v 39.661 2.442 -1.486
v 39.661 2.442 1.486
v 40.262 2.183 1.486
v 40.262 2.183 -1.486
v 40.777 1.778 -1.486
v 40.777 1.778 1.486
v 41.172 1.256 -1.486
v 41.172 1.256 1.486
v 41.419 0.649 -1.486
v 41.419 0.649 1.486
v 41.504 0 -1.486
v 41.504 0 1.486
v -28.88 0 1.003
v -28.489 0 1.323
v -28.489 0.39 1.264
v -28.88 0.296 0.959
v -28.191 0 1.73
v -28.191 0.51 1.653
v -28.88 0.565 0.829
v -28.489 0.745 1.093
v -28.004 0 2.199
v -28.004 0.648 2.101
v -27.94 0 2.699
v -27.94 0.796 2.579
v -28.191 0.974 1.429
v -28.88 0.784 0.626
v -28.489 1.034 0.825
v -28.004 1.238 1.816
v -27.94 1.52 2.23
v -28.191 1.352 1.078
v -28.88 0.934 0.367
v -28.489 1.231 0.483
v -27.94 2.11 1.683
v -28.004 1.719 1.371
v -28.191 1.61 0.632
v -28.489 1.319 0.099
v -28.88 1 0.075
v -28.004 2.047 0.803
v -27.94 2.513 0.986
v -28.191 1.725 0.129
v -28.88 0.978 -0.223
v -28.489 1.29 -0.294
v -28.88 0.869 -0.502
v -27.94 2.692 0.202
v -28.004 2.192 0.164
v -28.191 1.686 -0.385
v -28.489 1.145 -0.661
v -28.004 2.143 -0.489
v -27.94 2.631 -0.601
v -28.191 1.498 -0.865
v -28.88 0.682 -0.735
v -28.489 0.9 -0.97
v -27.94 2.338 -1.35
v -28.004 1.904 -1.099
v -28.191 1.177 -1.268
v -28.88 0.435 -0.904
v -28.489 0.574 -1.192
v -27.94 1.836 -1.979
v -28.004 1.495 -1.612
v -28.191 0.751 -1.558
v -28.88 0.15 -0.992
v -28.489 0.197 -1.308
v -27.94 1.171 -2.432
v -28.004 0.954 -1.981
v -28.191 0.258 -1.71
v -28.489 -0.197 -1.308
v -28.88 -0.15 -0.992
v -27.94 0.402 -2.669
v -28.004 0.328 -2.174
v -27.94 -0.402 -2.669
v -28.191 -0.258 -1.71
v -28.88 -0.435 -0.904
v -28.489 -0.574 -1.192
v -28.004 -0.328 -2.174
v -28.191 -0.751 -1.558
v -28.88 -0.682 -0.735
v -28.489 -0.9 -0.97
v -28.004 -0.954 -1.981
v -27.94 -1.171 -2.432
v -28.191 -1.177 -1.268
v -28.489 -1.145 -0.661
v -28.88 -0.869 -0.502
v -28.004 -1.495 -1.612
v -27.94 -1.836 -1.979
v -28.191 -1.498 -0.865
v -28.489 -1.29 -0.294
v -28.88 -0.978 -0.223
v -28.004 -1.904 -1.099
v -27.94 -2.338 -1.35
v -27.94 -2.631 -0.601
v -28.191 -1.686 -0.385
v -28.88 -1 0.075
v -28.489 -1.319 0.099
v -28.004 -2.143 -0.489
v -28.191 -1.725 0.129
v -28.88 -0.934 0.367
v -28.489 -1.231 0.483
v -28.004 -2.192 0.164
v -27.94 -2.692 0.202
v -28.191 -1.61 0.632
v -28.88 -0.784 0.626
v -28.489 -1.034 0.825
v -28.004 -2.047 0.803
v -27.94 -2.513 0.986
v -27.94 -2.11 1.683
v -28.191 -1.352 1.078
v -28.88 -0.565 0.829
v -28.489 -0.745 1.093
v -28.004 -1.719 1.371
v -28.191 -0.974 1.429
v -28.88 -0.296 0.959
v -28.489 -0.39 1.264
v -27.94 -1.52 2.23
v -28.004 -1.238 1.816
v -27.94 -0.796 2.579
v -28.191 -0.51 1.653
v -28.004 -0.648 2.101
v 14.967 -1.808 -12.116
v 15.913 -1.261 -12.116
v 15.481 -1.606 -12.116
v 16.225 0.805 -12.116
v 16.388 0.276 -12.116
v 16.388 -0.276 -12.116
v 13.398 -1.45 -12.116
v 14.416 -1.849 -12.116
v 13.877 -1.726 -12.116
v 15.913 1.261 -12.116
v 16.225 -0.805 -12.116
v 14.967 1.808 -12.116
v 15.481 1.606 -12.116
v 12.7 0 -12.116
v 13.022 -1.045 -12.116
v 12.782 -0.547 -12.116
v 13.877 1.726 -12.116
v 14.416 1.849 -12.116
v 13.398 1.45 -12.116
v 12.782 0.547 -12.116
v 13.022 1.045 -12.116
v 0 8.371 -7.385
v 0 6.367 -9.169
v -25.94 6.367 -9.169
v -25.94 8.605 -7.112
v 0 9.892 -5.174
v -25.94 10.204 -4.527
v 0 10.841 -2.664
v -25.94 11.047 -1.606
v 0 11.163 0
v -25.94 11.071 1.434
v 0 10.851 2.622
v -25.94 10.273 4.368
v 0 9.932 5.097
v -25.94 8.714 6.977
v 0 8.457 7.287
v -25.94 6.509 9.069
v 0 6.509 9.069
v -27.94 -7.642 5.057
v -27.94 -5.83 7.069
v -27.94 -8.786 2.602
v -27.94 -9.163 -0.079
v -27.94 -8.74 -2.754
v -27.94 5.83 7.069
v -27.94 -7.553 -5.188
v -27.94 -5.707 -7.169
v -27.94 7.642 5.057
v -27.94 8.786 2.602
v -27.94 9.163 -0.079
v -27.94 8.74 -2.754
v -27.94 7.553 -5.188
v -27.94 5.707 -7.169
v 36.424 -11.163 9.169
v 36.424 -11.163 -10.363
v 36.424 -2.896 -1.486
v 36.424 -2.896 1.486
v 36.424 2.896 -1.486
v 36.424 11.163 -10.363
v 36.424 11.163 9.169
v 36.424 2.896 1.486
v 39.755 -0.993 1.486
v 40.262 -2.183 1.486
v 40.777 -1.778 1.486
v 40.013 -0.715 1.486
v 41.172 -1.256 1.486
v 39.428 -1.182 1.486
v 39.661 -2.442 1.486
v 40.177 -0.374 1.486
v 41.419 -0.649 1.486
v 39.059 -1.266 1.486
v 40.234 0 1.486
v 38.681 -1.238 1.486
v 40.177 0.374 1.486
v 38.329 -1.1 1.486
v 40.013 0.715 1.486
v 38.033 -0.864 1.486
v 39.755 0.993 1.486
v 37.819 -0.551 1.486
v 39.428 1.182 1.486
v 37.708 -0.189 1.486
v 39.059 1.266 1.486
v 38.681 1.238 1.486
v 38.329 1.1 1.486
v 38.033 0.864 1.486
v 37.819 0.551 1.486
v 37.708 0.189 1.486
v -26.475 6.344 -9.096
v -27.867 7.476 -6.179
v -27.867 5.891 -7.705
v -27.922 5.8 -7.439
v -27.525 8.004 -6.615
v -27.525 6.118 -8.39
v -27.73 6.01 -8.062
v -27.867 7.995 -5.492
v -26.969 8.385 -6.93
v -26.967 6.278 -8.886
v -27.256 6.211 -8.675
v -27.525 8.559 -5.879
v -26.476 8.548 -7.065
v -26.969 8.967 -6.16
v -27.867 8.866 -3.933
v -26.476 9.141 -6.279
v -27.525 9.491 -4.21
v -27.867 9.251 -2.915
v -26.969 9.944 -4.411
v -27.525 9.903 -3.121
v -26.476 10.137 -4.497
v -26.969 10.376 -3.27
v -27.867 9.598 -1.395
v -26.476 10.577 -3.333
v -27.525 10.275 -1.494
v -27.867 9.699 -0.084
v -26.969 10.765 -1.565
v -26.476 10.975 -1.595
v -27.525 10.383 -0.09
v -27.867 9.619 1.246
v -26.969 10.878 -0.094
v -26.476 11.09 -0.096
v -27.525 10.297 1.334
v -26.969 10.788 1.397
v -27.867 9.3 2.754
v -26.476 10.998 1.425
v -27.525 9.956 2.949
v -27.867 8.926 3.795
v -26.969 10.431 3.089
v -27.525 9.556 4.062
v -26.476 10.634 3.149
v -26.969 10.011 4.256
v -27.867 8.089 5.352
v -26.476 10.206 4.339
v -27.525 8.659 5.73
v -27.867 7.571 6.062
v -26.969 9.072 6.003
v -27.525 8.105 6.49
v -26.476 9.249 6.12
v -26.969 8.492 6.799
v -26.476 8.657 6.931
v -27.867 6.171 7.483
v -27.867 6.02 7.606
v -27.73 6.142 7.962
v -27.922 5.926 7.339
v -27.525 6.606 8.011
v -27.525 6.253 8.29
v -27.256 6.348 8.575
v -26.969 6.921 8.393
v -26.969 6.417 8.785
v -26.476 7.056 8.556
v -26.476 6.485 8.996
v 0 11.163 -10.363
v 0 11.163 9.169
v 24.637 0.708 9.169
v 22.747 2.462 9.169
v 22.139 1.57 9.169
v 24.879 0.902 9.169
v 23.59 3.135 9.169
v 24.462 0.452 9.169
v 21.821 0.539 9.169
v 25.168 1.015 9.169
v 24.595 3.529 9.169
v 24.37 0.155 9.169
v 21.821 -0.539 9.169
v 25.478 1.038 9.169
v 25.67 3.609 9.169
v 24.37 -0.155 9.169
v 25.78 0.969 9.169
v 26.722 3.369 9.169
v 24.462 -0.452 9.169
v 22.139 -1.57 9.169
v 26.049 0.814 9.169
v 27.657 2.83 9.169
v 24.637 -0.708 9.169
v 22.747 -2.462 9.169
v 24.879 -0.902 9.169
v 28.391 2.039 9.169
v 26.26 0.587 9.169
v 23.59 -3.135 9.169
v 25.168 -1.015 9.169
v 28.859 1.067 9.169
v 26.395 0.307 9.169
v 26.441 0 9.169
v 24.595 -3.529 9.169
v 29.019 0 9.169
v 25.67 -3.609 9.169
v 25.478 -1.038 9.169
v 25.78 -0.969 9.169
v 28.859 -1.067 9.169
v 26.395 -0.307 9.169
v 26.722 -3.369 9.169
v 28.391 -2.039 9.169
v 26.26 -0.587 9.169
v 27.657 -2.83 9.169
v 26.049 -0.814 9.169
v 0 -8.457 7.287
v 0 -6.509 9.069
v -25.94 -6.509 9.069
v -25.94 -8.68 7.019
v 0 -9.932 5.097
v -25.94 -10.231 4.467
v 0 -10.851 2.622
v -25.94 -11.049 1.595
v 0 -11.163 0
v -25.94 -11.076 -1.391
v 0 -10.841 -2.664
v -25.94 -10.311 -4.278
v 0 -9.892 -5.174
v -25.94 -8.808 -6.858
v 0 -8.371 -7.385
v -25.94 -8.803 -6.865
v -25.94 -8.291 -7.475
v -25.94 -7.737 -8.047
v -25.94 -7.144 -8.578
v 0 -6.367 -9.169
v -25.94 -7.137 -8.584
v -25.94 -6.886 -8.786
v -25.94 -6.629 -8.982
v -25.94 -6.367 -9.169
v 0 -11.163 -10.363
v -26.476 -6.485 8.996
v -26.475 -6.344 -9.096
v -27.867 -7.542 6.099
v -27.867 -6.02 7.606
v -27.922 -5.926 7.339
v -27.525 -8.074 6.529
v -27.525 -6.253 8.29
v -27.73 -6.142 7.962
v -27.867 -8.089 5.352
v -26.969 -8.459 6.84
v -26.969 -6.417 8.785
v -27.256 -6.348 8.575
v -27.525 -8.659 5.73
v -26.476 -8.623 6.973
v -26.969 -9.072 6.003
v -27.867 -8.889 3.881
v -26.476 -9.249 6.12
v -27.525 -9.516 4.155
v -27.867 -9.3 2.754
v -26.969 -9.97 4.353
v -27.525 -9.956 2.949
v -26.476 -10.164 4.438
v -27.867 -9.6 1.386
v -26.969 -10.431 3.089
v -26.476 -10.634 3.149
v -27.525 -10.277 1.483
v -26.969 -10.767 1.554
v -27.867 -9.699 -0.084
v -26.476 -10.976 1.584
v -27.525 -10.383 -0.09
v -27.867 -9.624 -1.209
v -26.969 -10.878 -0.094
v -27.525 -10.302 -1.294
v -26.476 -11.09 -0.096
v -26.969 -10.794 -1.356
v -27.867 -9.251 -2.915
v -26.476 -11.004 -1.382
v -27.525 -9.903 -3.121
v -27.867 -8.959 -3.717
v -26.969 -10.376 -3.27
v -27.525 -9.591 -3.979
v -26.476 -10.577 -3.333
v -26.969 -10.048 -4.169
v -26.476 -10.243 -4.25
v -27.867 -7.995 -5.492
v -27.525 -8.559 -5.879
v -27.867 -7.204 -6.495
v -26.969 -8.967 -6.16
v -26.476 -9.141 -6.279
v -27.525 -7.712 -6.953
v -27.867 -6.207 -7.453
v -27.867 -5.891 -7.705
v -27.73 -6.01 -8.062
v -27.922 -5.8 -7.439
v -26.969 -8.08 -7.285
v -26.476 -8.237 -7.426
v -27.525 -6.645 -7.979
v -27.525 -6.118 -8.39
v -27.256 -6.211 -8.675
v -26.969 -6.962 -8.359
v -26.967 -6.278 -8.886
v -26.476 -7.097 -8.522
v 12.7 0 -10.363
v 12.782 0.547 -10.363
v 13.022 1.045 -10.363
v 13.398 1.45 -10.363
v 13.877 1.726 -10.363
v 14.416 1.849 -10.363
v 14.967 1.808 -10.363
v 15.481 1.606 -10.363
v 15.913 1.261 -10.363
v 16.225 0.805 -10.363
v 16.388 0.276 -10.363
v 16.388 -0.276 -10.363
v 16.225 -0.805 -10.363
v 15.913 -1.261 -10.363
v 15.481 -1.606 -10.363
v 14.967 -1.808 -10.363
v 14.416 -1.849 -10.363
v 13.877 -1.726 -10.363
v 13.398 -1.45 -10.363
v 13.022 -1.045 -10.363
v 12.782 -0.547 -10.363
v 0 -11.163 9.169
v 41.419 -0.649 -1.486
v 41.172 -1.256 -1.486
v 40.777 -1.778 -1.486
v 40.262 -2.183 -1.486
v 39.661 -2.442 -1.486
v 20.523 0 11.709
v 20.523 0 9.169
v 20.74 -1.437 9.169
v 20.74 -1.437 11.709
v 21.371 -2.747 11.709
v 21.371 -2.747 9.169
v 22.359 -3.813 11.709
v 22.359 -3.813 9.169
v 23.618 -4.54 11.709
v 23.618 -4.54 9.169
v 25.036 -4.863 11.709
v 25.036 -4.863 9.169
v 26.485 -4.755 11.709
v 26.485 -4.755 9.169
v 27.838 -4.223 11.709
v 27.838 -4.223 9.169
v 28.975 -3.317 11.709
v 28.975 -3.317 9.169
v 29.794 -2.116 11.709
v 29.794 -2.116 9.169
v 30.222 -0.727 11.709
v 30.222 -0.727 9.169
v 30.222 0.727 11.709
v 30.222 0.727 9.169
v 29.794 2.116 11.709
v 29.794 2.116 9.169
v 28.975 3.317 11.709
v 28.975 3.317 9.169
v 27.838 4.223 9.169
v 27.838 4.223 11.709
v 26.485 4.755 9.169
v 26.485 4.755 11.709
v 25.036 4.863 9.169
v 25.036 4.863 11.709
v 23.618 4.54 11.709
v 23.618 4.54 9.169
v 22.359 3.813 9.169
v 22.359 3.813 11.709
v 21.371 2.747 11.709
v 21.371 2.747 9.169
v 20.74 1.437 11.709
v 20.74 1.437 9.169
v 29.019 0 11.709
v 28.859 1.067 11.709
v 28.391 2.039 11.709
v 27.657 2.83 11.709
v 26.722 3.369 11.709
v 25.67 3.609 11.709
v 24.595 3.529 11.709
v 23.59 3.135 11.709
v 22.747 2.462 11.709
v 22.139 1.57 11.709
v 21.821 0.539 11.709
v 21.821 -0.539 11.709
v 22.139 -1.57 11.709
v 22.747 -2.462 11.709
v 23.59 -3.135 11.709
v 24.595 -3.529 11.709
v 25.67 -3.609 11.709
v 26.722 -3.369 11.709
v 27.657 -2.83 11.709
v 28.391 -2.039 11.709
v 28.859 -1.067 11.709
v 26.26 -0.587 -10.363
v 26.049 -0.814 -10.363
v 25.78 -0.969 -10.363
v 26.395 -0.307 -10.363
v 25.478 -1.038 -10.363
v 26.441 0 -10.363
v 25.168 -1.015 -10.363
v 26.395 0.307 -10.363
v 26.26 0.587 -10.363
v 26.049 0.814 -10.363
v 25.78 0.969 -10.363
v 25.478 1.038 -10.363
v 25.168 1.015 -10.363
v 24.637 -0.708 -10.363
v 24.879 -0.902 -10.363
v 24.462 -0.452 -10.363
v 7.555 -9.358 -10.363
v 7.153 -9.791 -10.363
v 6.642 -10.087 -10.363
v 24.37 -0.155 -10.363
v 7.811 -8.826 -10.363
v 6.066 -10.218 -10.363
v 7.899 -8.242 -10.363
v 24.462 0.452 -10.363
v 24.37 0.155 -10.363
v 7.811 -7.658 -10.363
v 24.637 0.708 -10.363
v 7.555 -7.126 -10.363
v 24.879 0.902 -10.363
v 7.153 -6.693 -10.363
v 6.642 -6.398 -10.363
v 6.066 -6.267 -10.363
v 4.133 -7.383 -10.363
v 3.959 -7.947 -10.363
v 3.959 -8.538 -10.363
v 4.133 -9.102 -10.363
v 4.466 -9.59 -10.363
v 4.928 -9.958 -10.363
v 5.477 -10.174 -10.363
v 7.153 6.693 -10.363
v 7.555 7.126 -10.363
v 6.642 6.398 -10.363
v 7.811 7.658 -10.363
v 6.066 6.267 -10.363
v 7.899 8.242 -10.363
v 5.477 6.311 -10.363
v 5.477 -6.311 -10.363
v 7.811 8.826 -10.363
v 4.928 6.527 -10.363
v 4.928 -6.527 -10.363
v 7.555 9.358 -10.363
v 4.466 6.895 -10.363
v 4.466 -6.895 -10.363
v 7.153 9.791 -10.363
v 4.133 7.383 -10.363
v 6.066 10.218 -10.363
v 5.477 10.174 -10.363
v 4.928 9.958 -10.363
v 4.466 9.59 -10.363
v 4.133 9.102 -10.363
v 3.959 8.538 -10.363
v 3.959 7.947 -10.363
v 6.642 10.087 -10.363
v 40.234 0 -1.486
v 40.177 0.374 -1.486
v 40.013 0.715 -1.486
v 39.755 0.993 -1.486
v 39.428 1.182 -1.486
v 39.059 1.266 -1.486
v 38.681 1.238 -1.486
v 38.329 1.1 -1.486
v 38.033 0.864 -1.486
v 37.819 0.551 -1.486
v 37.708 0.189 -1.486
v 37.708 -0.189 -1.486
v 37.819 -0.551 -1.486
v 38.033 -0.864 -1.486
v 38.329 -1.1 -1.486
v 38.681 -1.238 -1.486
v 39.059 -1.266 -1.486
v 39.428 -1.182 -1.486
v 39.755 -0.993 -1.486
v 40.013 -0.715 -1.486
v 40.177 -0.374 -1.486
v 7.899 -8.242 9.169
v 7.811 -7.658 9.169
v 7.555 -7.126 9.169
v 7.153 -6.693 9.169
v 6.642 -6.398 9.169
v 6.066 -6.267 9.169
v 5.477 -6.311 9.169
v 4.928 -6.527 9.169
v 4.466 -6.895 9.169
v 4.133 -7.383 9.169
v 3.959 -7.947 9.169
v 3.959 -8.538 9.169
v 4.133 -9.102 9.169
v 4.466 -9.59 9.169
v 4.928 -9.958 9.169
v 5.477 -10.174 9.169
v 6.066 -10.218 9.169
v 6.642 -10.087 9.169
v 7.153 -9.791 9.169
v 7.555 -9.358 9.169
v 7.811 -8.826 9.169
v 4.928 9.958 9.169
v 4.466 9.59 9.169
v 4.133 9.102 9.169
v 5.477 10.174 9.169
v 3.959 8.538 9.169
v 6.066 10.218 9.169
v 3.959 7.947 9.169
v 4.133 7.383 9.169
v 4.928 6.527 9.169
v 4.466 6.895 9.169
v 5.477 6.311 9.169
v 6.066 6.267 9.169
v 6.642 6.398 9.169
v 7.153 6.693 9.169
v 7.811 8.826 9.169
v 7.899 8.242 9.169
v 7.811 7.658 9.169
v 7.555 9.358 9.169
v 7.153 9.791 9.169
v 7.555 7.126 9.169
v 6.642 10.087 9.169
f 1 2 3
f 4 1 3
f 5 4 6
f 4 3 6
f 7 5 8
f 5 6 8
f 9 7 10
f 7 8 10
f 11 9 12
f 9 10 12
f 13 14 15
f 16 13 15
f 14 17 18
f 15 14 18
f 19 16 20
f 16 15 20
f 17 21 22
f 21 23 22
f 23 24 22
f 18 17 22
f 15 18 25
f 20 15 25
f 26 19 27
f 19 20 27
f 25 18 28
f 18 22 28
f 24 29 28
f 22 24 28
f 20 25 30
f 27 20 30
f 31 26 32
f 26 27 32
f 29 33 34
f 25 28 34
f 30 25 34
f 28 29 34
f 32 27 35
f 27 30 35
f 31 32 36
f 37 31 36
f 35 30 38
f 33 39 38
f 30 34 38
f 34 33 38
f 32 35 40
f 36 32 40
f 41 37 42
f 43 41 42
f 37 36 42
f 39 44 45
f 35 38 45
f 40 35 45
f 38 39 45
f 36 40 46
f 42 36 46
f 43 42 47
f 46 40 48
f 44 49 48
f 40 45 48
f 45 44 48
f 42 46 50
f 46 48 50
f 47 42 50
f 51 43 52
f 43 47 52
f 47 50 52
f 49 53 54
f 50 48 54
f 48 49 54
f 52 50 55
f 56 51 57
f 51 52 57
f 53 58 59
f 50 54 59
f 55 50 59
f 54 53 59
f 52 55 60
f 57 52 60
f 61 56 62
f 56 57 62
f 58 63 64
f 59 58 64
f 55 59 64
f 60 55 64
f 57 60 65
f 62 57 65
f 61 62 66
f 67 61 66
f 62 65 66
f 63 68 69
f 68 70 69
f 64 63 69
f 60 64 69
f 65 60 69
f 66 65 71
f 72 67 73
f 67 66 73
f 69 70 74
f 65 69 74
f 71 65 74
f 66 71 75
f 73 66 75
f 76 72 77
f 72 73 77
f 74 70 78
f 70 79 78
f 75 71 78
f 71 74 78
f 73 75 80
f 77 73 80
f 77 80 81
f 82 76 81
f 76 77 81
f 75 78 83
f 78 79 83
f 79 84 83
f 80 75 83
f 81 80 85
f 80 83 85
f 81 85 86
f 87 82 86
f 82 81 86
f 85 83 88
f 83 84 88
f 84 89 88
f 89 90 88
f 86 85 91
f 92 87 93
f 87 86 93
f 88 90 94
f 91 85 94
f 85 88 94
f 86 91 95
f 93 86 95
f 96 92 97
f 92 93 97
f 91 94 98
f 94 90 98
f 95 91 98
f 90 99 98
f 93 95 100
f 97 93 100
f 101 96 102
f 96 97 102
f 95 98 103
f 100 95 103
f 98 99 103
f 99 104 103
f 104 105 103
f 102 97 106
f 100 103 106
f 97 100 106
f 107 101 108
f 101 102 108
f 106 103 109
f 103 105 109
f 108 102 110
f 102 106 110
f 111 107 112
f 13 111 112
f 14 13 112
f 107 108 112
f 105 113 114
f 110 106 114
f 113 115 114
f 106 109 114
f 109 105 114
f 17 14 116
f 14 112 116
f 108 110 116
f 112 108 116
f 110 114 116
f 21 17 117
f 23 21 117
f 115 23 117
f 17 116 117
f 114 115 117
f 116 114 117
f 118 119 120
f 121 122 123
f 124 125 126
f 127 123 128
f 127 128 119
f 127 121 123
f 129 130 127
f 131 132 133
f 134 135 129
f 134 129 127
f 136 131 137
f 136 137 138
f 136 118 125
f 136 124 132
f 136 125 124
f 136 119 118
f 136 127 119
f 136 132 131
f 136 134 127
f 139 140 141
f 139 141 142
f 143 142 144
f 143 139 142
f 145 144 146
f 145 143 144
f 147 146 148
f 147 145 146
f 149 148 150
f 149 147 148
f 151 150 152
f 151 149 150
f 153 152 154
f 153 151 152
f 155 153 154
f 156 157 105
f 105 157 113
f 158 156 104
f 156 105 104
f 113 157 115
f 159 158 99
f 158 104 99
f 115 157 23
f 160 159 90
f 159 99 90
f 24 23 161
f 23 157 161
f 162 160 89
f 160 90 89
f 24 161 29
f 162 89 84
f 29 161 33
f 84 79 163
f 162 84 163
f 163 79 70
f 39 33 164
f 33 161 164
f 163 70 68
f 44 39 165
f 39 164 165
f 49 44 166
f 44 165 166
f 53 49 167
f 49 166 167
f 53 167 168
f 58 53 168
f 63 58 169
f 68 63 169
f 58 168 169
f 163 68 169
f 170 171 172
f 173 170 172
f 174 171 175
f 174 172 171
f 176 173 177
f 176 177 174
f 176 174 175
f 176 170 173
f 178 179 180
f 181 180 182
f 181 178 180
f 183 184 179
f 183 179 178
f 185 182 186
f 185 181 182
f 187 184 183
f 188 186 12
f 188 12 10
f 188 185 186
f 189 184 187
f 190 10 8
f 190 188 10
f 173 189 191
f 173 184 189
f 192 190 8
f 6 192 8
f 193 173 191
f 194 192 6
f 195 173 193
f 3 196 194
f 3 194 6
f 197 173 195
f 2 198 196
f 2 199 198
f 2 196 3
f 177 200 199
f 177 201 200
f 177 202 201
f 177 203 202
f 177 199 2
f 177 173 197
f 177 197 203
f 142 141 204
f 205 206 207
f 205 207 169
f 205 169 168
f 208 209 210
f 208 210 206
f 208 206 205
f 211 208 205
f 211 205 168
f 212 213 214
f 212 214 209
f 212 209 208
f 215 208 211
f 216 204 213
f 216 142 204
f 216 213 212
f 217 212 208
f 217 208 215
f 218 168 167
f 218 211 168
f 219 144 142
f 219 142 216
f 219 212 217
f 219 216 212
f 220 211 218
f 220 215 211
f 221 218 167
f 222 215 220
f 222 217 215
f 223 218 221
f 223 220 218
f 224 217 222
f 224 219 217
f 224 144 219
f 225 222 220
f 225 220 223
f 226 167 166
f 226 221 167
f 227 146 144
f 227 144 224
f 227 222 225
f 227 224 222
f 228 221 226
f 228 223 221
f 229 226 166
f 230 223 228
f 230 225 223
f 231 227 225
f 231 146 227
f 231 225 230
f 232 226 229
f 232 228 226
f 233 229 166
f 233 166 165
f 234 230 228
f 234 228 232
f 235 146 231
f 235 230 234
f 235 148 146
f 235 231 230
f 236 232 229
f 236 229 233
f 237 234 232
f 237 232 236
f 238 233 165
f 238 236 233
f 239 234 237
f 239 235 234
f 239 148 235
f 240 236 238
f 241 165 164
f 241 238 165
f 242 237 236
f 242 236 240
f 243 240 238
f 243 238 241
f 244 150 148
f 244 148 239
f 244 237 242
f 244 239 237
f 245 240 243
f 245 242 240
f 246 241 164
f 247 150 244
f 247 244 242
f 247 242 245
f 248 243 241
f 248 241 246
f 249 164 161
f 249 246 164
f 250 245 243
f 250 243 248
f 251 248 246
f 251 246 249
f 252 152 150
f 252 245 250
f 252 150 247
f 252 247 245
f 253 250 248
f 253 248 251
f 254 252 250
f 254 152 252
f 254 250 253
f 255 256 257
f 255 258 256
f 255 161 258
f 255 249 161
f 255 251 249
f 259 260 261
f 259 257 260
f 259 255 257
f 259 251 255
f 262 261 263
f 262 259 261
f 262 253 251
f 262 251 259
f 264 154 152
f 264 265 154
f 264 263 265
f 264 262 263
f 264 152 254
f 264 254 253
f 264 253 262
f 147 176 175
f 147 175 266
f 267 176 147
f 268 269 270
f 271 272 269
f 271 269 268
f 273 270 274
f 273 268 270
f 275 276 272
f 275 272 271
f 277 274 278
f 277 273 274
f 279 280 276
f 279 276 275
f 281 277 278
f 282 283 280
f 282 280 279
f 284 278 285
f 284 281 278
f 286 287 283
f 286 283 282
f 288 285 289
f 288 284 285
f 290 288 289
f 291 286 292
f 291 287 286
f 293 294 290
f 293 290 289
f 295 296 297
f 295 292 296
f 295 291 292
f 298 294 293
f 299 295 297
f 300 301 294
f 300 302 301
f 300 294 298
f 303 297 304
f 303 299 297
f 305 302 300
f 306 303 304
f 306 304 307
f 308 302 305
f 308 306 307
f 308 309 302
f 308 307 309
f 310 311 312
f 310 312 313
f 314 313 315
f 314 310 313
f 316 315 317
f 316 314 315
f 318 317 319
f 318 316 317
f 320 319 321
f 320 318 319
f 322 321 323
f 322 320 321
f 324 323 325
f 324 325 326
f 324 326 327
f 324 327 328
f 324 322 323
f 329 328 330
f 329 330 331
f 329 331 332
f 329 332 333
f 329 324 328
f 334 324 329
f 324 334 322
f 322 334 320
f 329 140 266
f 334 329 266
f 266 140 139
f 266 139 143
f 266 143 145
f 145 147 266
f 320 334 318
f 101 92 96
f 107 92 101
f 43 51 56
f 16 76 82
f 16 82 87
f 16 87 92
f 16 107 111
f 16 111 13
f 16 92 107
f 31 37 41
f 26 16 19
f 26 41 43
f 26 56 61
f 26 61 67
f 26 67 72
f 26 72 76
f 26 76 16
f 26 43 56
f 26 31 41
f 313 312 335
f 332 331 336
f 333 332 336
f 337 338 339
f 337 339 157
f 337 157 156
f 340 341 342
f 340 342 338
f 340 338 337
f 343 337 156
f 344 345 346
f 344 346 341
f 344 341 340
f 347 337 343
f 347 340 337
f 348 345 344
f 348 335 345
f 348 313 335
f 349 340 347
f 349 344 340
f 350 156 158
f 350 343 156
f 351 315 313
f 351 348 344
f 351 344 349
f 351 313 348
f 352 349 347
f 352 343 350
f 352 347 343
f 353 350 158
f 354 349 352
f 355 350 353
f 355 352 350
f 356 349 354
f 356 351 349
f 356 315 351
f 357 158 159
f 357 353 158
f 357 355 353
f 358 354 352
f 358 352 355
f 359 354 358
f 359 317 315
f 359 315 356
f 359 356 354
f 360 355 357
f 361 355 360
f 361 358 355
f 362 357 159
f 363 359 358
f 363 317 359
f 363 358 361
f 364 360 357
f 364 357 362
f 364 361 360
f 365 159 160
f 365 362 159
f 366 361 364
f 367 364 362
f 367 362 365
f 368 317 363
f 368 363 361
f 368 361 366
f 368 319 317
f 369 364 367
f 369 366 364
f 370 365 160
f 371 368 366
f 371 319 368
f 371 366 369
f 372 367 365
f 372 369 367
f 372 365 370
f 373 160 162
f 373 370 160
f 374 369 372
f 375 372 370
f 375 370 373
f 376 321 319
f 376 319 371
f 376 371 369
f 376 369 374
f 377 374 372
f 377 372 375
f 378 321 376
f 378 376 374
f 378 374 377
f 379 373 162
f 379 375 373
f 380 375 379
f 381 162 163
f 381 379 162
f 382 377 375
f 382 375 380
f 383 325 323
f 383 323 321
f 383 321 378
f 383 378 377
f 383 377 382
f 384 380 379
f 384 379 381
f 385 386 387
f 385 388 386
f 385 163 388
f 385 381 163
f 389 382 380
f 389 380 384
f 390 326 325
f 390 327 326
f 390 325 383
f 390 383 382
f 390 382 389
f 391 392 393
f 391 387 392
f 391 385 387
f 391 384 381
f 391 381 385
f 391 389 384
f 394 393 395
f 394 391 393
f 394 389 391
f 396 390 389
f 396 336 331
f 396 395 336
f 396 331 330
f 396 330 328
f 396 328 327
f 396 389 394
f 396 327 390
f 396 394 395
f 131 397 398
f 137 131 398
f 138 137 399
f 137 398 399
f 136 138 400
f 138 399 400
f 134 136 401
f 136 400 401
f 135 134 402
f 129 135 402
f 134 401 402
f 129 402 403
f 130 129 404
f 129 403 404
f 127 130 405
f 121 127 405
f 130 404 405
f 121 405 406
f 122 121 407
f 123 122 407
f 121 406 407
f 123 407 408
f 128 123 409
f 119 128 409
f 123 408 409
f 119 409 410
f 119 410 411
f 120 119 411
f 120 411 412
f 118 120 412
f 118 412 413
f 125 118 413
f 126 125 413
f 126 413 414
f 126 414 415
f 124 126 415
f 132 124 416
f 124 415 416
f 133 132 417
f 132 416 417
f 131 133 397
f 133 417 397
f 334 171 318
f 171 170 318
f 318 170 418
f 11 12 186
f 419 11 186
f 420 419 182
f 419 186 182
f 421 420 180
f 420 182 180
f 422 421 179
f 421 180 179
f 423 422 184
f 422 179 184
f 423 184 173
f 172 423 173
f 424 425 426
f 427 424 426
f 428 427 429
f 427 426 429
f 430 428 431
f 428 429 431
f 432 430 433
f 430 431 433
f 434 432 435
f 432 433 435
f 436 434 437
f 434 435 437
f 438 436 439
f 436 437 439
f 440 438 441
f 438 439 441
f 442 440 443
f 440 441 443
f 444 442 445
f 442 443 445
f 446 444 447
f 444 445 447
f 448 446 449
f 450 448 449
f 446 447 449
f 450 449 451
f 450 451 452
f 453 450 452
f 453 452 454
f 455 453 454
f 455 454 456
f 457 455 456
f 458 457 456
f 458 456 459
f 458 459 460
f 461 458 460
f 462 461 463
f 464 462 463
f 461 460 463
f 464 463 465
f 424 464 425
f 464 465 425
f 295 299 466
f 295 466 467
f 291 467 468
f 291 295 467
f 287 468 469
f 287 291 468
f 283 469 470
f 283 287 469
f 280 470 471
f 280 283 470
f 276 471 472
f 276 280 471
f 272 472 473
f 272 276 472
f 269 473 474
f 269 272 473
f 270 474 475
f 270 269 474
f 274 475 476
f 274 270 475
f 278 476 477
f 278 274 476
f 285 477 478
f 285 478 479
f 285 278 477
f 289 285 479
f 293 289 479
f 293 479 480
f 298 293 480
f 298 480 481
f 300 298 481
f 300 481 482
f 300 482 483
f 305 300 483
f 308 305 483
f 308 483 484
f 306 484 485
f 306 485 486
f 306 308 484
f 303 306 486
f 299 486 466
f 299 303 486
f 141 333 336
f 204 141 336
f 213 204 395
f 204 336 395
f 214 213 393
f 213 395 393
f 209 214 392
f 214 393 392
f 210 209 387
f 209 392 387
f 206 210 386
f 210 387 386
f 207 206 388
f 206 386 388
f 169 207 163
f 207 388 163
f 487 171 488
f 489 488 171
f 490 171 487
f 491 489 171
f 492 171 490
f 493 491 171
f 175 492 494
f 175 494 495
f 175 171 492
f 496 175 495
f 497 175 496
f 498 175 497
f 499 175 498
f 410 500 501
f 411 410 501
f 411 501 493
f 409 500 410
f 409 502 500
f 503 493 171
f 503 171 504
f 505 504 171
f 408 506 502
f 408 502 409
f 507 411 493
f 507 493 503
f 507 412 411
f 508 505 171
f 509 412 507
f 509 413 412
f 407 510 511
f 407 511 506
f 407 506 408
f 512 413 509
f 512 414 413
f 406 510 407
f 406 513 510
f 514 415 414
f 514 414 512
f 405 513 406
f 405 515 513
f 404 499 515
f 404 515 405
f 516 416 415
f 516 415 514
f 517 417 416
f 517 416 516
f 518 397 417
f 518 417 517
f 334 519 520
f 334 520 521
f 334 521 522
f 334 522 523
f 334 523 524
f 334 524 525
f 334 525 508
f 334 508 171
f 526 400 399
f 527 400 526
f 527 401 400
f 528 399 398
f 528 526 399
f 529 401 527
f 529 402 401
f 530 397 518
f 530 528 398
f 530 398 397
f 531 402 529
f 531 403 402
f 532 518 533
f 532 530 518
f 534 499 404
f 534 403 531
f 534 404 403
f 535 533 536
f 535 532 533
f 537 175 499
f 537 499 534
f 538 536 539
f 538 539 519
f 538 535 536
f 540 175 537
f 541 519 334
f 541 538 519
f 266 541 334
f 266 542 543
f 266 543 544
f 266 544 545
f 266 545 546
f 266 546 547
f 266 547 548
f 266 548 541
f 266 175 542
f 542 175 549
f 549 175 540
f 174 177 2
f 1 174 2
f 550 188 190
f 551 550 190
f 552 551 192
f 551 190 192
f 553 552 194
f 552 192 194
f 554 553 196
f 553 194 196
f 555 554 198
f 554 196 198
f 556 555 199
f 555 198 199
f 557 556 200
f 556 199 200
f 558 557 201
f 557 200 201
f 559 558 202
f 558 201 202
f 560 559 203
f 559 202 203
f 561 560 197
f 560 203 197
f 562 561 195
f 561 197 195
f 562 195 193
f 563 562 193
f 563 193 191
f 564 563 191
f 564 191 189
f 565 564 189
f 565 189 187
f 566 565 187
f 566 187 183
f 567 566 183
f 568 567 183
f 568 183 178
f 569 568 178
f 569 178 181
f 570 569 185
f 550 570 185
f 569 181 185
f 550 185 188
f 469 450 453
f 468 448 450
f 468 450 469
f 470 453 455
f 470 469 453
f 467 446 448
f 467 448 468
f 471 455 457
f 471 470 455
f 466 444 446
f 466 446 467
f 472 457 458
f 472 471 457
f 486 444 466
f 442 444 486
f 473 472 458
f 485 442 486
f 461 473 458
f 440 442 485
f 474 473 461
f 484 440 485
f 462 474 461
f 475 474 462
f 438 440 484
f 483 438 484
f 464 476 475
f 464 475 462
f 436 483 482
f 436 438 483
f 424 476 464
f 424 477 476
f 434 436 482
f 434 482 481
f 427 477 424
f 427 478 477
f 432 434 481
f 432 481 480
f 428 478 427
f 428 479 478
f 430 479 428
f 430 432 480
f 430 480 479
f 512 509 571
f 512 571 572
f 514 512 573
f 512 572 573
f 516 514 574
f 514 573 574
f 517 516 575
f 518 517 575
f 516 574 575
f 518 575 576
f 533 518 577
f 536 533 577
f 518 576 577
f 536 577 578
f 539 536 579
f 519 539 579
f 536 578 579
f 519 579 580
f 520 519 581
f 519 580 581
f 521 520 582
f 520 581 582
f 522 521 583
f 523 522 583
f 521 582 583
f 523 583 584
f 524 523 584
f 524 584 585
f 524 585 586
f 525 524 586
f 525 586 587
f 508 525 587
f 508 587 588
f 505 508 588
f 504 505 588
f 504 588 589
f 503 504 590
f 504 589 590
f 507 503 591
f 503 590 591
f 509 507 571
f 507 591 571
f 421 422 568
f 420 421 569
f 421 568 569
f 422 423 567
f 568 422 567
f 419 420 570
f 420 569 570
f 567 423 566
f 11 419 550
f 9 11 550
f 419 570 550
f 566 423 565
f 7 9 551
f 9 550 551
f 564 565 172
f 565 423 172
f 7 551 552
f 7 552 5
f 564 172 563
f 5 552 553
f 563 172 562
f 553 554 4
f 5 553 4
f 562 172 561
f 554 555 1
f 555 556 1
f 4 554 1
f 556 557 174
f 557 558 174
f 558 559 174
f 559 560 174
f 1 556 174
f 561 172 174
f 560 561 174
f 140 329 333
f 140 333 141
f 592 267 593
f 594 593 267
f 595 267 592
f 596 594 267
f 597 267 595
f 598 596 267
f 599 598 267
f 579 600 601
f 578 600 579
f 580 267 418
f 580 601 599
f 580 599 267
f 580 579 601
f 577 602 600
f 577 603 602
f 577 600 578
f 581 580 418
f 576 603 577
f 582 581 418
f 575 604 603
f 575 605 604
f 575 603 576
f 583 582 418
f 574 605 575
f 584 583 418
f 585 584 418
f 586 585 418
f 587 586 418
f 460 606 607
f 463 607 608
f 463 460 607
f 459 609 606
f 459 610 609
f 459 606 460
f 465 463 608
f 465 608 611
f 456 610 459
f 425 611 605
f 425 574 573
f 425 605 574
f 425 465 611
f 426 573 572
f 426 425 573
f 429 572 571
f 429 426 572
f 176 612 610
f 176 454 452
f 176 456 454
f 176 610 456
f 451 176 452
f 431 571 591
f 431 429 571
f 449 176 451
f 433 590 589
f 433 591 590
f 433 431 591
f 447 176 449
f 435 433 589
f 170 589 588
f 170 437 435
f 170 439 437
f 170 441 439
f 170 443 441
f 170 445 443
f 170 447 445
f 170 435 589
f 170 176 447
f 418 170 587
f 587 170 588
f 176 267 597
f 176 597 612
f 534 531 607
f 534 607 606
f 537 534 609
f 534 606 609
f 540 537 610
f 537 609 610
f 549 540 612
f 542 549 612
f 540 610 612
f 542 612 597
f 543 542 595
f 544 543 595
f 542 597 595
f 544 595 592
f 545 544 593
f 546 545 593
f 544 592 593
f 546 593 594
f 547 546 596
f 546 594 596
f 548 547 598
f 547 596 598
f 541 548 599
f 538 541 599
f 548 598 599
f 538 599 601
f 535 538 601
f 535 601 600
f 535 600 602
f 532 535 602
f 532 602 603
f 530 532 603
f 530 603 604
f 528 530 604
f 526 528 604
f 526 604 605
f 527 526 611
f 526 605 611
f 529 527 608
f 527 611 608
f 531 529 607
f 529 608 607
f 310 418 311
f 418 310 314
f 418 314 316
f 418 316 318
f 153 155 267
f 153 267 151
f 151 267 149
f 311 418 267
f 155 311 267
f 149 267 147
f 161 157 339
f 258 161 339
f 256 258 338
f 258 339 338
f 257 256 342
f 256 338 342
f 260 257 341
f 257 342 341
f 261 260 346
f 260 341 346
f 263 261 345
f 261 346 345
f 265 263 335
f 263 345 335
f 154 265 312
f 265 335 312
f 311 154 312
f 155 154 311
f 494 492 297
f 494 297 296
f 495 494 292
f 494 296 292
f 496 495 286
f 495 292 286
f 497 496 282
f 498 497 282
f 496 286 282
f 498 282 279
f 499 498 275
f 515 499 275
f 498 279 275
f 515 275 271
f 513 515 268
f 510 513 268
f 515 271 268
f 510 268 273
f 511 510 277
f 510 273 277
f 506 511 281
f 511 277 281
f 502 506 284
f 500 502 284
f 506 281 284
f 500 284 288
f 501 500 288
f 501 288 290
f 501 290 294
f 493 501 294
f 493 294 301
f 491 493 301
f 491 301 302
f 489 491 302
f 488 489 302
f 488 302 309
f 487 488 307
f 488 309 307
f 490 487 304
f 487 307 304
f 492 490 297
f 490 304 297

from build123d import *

# Parameters (mm, degrees)
SKETCH1_W           = 18.3388
SKETCH1_H           = 22.3266
BOSS_EXTRUDE1_DEPTH = 36.4236
BOSS_EXTRUDE2_DEPTH = 27.94
SKETCH3_R           = 1.0033
BOSS_EXTRUDE3_DEPTH = 0.9398
SKETCH4_W           = 2.9718
SKETCH4_H           = 5.7912
BOSS_EXTRUDE4_DEPTH = 5.08
SKETCH5_R           = 1.27
CUT_EXTRUDE3_DEPTH  = 2.9718
SKETCH7_R           = 4.8768
SKETCH7_R_2         = 3.6195
BOSS_EXTRUDE5_DEPTH = 2.54
SKETCH9_W           = 36.4236
SKETCH9_H           = 22.3266
BOSS_EXTRUDE6_DEPTH = 1.1938
SKETCH8_R           = 1.0414
SKETCH8_R_2         = 1.9812
CUT_EXTRUDE4_DEPTH  = 19.5326
SKETCH10_R          = 1.8542
BOSS_EXTRUDE7_DEPTH = 1.7526
SKETCH11_W          = 30.653846682
SKETCH11_H          = 27.216421179
CUT_EXTRUDE5_DEPTH  = 0.1
FILLET1_R           = 2


with BuildPart() as part:
    # Sketch1 → Boss-Extrude1 (new body)
    with BuildSketch(Plane(origin=(0, 0, 0), x_dir=(0, 0, -1), z_dir=(1, 0, 0))):
        Rectangle(SKETCH1_W, SKETCH1_H)
    extrude(amount=BOSS_EXTRUDE1_DEPTH)

    # Sketch2 → Boss-Extrude2 (add)
    with BuildSketch(Plane.ZY):
        with BuildLine():
            Line((-9.1694, -6.367210577), (-9.1694, 6.367210577))
            ThreePointArc((-9.1694, 6.367210577), (0, 11.1633), (9.1694, 6.367210577))
            Line((9.1694, 6.367210577), (9.1694, -6.367210577))
            ThreePointArc((9.1694, -6.367210577), (0, -11.1633), (-9.1694, -6.367210577))
        make_face()
    extrude(amount=BOSS_EXTRUDE2_DEPTH)

    # Sketch3 → Boss-Extrude3 (add)
    with BuildSketch(Plane.ZY.offset(27.94)):
        Circle(SKETCH3_R)
    extrude(amount=BOSS_EXTRUDE3_DEPTH)

    # Sketch4 → Boss-Extrude4 (add)
    with BuildSketch(Plane(origin=(36.4236, 0, 0), x_dir=(0, 0, -1), z_dir=(1, 0, 0))):
        Rectangle(SKETCH4_W, SKETCH4_H)
    extrude(amount=BOSS_EXTRUDE4_DEPTH)

    # Sketch5 → Cut-Extrude3 (cut)
    with BuildSketch(Plane.XY.offset(1.4859)):
        with BuildLine():
            Line((36.4236, 2.8956), (39.661128443, 2.442346018))
            ThreePointArc((39.661128443, 2.442346018), (40.991323146, 1.529685864), (41.5036, -2.8e-08))
            Line((41.5036, -2.8e-08), (41.5036, 2.8956))
            Line((41.5036, 2.8956), (36.4236, 2.8956))
        make_face()
        with BuildLine():
            Line((41.5036, -2.8956), (41.5036, -2.8e-08))
            ThreePointArc((41.5036, -2.8e-08), (40.991323129, -1.529685887), (39.661128443, -2.442346018))
            Line((39.661128443, -2.442346018), (36.4236, -2.8956))
            Line((36.4236, -2.8956), (41.5036, -2.8956))
        make_face()
        with Locations((38.9636, 0)):
            Circle(SKETCH5_R)
    extrude(amount=-CUT_EXTRUDE3_DEPTH, mode=Mode.SUBTRACT)

    # Sketch7 → Boss-Extrude5 (add)
    with BuildSketch(Plane.XY.offset(9.1694)):
        with Locations(Location((25.4, 0, 0), (0, 0, 180))):
            Circle(SKETCH7_R)
        with Locations((25.4, 0)):
            Circle(SKETCH7_R_2, mode=Mode.SUBTRACT)
    extrude(amount=BOSS_EXTRUDE5_DEPTH)

    # Sketch9 → Boss-Extrude6 (add)
    with BuildSketch(Plane(origin=(0, 0, -9.1694), x_dir=(-1, 0, 0), z_dir=(0, 0, -1))):
        with Locations((-18.2118, 0)):
            Rectangle(SKETCH9_W, SKETCH9_H)
    extrude(amount=BOSS_EXTRUDE6_DEPTH)

    # Sketch8 → Cut-Extrude4 (cut)
    with BuildSketch(Plane.XY.offset(9.1694)):
        with Locations((25.4, 0)):
            Circle(SKETCH8_R)
        with Locations((5.9182, 8.2423)):
            Circle(SKETCH8_R_2)
        with Locations((5.9182, -8.2423)):
            Circle(SKETCH8_R_2)
    extrude(amount=-CUT_EXTRUDE4_DEPTH, mode=Mode.SUBTRACT)

    # Sketch10 → Boss-Extrude7 (add)
    with BuildSketch(Plane(origin=(0, 0, -10.3632), x_dir=(-1, 0, 0), z_dir=(0, 0, -1))):
        with Locations((-14.5542, 0)):
            Circle(SKETCH10_R)
    extrude(amount=BOSS_EXTRUDE7_DEPTH)

    # Sketch11 → Cut-Extrude5 (cut)
    with BuildSketch(Plane.XY.offset(9.1694)):
        with Locations((-15.326923341, 2.44491059)):
            Rectangle(SKETCH11_W, SKETCH11_H)
    extrude(amount=-CUT_EXTRUDE5_DEPTH, mode=Mode.SUBTRACT)

    # Fillet1
    # the kernel refuses this fillet: 2 mm, written as the material it adds along each edge
    with BuildSketch(Plane(origin=(-27.94, 0, 0), x_dir=(0, 0, 1), z_dir=(0, -1, 0))) as fillet1_piece_1:
        with BuildLine():
            CenterArc((2.699170266, 2), FILLET1_R, 212.012211673, 57.987788327)
            Line((1.0033, 0.9398), (1.0033, 0))
            Line((1.0033, 0), (2.699170266, 0))
        make_face()
    revolve(axis=Axis((-27.94, 0, 0), (-1, 0, 0)))
    # the kernel refuses this fillet: 2 mm, written as the material it takes off along each edge
    with BuildSketch(Plane(origin=(-27.94, -11.367210577, -9.1694), x_dir=(1, 0, 0), z_dir=(0, 1, 0))) as fillet1_2_piece_1:
        with BuildLine():
            CenterArc((FILLET1_R, -FILLET1_R), FILLET1_R, 90, 90)
            Line((0, -FILLET1_R), (0, 0))
            Line((0, 0), (FILLET1_R, 0))
        make_face()
    extrude(amount=22.734421154, mode=Mode.SUBTRACT)
    with BuildSketch(Plane(origin=(-27.94, 0, 0), x_dir=(0, 0.15812676738734943, -0.9874188196685473), z_dir=(0, -0.9874188196685473, -0.15812676738734943))) as fillet1_2_piece_2:
        with BuildLine():
            CenterArc((11.1633 - FILLET1_R, FILLET1_R), FILLET1_R, 270, 90)
            Line((11.1633 - FILLET1_R, 0), (11.1633, 0))
            Line((11.1633, 0), (11.1633, FILLET1_R))
        make_face()
    revolve(axis=Axis((-27.94, 0, 0), (1, 0, 0)), revolution_arc=178.888182092, mode=Mode.SUBTRACT)
    with BuildSketch(Plane(origin=(-27.94, -11.508859388, 9.0694), x_dir=(1, 0, 0), z_dir=(0, 1, 0))) as fillet1_2_piece_3:
        with BuildLine():
            CenterArc((FILLET1_R, FILLET1_R), FILLET1_R, 180, 90)
            Line((0, FILLET1_R), (0, 0))
            Line((0, 0), (FILLET1_R, 0))
        make_face()
    extrude(amount=23.017718776, mode=Mode.SUBTRACT)
    with BuildSketch(Plane(origin=(-27.94, 0, 0), x_dir=(0, 0.1389374526808322, 0.9903011583566695), z_dir=(0, 0.9903011583566695, -0.1389374526808322))) as fillet1_2_piece_4:
        with BuildLine():
            CenterArc((11.1633 - FILLET1_R, FILLET1_R), FILLET1_R, 270, 90)
            Line((11.1633 - FILLET1_R, 0), (11.1633, 0))
            Line((11.1633, 0), (11.1633, FILLET1_R))
        make_face()
    revolve(axis=Axis((-27.94, 0, 0), (1, 0, 0)), revolution_arc=178.888182092, mode=Mode.SUBTRACT)


solid = part.part
